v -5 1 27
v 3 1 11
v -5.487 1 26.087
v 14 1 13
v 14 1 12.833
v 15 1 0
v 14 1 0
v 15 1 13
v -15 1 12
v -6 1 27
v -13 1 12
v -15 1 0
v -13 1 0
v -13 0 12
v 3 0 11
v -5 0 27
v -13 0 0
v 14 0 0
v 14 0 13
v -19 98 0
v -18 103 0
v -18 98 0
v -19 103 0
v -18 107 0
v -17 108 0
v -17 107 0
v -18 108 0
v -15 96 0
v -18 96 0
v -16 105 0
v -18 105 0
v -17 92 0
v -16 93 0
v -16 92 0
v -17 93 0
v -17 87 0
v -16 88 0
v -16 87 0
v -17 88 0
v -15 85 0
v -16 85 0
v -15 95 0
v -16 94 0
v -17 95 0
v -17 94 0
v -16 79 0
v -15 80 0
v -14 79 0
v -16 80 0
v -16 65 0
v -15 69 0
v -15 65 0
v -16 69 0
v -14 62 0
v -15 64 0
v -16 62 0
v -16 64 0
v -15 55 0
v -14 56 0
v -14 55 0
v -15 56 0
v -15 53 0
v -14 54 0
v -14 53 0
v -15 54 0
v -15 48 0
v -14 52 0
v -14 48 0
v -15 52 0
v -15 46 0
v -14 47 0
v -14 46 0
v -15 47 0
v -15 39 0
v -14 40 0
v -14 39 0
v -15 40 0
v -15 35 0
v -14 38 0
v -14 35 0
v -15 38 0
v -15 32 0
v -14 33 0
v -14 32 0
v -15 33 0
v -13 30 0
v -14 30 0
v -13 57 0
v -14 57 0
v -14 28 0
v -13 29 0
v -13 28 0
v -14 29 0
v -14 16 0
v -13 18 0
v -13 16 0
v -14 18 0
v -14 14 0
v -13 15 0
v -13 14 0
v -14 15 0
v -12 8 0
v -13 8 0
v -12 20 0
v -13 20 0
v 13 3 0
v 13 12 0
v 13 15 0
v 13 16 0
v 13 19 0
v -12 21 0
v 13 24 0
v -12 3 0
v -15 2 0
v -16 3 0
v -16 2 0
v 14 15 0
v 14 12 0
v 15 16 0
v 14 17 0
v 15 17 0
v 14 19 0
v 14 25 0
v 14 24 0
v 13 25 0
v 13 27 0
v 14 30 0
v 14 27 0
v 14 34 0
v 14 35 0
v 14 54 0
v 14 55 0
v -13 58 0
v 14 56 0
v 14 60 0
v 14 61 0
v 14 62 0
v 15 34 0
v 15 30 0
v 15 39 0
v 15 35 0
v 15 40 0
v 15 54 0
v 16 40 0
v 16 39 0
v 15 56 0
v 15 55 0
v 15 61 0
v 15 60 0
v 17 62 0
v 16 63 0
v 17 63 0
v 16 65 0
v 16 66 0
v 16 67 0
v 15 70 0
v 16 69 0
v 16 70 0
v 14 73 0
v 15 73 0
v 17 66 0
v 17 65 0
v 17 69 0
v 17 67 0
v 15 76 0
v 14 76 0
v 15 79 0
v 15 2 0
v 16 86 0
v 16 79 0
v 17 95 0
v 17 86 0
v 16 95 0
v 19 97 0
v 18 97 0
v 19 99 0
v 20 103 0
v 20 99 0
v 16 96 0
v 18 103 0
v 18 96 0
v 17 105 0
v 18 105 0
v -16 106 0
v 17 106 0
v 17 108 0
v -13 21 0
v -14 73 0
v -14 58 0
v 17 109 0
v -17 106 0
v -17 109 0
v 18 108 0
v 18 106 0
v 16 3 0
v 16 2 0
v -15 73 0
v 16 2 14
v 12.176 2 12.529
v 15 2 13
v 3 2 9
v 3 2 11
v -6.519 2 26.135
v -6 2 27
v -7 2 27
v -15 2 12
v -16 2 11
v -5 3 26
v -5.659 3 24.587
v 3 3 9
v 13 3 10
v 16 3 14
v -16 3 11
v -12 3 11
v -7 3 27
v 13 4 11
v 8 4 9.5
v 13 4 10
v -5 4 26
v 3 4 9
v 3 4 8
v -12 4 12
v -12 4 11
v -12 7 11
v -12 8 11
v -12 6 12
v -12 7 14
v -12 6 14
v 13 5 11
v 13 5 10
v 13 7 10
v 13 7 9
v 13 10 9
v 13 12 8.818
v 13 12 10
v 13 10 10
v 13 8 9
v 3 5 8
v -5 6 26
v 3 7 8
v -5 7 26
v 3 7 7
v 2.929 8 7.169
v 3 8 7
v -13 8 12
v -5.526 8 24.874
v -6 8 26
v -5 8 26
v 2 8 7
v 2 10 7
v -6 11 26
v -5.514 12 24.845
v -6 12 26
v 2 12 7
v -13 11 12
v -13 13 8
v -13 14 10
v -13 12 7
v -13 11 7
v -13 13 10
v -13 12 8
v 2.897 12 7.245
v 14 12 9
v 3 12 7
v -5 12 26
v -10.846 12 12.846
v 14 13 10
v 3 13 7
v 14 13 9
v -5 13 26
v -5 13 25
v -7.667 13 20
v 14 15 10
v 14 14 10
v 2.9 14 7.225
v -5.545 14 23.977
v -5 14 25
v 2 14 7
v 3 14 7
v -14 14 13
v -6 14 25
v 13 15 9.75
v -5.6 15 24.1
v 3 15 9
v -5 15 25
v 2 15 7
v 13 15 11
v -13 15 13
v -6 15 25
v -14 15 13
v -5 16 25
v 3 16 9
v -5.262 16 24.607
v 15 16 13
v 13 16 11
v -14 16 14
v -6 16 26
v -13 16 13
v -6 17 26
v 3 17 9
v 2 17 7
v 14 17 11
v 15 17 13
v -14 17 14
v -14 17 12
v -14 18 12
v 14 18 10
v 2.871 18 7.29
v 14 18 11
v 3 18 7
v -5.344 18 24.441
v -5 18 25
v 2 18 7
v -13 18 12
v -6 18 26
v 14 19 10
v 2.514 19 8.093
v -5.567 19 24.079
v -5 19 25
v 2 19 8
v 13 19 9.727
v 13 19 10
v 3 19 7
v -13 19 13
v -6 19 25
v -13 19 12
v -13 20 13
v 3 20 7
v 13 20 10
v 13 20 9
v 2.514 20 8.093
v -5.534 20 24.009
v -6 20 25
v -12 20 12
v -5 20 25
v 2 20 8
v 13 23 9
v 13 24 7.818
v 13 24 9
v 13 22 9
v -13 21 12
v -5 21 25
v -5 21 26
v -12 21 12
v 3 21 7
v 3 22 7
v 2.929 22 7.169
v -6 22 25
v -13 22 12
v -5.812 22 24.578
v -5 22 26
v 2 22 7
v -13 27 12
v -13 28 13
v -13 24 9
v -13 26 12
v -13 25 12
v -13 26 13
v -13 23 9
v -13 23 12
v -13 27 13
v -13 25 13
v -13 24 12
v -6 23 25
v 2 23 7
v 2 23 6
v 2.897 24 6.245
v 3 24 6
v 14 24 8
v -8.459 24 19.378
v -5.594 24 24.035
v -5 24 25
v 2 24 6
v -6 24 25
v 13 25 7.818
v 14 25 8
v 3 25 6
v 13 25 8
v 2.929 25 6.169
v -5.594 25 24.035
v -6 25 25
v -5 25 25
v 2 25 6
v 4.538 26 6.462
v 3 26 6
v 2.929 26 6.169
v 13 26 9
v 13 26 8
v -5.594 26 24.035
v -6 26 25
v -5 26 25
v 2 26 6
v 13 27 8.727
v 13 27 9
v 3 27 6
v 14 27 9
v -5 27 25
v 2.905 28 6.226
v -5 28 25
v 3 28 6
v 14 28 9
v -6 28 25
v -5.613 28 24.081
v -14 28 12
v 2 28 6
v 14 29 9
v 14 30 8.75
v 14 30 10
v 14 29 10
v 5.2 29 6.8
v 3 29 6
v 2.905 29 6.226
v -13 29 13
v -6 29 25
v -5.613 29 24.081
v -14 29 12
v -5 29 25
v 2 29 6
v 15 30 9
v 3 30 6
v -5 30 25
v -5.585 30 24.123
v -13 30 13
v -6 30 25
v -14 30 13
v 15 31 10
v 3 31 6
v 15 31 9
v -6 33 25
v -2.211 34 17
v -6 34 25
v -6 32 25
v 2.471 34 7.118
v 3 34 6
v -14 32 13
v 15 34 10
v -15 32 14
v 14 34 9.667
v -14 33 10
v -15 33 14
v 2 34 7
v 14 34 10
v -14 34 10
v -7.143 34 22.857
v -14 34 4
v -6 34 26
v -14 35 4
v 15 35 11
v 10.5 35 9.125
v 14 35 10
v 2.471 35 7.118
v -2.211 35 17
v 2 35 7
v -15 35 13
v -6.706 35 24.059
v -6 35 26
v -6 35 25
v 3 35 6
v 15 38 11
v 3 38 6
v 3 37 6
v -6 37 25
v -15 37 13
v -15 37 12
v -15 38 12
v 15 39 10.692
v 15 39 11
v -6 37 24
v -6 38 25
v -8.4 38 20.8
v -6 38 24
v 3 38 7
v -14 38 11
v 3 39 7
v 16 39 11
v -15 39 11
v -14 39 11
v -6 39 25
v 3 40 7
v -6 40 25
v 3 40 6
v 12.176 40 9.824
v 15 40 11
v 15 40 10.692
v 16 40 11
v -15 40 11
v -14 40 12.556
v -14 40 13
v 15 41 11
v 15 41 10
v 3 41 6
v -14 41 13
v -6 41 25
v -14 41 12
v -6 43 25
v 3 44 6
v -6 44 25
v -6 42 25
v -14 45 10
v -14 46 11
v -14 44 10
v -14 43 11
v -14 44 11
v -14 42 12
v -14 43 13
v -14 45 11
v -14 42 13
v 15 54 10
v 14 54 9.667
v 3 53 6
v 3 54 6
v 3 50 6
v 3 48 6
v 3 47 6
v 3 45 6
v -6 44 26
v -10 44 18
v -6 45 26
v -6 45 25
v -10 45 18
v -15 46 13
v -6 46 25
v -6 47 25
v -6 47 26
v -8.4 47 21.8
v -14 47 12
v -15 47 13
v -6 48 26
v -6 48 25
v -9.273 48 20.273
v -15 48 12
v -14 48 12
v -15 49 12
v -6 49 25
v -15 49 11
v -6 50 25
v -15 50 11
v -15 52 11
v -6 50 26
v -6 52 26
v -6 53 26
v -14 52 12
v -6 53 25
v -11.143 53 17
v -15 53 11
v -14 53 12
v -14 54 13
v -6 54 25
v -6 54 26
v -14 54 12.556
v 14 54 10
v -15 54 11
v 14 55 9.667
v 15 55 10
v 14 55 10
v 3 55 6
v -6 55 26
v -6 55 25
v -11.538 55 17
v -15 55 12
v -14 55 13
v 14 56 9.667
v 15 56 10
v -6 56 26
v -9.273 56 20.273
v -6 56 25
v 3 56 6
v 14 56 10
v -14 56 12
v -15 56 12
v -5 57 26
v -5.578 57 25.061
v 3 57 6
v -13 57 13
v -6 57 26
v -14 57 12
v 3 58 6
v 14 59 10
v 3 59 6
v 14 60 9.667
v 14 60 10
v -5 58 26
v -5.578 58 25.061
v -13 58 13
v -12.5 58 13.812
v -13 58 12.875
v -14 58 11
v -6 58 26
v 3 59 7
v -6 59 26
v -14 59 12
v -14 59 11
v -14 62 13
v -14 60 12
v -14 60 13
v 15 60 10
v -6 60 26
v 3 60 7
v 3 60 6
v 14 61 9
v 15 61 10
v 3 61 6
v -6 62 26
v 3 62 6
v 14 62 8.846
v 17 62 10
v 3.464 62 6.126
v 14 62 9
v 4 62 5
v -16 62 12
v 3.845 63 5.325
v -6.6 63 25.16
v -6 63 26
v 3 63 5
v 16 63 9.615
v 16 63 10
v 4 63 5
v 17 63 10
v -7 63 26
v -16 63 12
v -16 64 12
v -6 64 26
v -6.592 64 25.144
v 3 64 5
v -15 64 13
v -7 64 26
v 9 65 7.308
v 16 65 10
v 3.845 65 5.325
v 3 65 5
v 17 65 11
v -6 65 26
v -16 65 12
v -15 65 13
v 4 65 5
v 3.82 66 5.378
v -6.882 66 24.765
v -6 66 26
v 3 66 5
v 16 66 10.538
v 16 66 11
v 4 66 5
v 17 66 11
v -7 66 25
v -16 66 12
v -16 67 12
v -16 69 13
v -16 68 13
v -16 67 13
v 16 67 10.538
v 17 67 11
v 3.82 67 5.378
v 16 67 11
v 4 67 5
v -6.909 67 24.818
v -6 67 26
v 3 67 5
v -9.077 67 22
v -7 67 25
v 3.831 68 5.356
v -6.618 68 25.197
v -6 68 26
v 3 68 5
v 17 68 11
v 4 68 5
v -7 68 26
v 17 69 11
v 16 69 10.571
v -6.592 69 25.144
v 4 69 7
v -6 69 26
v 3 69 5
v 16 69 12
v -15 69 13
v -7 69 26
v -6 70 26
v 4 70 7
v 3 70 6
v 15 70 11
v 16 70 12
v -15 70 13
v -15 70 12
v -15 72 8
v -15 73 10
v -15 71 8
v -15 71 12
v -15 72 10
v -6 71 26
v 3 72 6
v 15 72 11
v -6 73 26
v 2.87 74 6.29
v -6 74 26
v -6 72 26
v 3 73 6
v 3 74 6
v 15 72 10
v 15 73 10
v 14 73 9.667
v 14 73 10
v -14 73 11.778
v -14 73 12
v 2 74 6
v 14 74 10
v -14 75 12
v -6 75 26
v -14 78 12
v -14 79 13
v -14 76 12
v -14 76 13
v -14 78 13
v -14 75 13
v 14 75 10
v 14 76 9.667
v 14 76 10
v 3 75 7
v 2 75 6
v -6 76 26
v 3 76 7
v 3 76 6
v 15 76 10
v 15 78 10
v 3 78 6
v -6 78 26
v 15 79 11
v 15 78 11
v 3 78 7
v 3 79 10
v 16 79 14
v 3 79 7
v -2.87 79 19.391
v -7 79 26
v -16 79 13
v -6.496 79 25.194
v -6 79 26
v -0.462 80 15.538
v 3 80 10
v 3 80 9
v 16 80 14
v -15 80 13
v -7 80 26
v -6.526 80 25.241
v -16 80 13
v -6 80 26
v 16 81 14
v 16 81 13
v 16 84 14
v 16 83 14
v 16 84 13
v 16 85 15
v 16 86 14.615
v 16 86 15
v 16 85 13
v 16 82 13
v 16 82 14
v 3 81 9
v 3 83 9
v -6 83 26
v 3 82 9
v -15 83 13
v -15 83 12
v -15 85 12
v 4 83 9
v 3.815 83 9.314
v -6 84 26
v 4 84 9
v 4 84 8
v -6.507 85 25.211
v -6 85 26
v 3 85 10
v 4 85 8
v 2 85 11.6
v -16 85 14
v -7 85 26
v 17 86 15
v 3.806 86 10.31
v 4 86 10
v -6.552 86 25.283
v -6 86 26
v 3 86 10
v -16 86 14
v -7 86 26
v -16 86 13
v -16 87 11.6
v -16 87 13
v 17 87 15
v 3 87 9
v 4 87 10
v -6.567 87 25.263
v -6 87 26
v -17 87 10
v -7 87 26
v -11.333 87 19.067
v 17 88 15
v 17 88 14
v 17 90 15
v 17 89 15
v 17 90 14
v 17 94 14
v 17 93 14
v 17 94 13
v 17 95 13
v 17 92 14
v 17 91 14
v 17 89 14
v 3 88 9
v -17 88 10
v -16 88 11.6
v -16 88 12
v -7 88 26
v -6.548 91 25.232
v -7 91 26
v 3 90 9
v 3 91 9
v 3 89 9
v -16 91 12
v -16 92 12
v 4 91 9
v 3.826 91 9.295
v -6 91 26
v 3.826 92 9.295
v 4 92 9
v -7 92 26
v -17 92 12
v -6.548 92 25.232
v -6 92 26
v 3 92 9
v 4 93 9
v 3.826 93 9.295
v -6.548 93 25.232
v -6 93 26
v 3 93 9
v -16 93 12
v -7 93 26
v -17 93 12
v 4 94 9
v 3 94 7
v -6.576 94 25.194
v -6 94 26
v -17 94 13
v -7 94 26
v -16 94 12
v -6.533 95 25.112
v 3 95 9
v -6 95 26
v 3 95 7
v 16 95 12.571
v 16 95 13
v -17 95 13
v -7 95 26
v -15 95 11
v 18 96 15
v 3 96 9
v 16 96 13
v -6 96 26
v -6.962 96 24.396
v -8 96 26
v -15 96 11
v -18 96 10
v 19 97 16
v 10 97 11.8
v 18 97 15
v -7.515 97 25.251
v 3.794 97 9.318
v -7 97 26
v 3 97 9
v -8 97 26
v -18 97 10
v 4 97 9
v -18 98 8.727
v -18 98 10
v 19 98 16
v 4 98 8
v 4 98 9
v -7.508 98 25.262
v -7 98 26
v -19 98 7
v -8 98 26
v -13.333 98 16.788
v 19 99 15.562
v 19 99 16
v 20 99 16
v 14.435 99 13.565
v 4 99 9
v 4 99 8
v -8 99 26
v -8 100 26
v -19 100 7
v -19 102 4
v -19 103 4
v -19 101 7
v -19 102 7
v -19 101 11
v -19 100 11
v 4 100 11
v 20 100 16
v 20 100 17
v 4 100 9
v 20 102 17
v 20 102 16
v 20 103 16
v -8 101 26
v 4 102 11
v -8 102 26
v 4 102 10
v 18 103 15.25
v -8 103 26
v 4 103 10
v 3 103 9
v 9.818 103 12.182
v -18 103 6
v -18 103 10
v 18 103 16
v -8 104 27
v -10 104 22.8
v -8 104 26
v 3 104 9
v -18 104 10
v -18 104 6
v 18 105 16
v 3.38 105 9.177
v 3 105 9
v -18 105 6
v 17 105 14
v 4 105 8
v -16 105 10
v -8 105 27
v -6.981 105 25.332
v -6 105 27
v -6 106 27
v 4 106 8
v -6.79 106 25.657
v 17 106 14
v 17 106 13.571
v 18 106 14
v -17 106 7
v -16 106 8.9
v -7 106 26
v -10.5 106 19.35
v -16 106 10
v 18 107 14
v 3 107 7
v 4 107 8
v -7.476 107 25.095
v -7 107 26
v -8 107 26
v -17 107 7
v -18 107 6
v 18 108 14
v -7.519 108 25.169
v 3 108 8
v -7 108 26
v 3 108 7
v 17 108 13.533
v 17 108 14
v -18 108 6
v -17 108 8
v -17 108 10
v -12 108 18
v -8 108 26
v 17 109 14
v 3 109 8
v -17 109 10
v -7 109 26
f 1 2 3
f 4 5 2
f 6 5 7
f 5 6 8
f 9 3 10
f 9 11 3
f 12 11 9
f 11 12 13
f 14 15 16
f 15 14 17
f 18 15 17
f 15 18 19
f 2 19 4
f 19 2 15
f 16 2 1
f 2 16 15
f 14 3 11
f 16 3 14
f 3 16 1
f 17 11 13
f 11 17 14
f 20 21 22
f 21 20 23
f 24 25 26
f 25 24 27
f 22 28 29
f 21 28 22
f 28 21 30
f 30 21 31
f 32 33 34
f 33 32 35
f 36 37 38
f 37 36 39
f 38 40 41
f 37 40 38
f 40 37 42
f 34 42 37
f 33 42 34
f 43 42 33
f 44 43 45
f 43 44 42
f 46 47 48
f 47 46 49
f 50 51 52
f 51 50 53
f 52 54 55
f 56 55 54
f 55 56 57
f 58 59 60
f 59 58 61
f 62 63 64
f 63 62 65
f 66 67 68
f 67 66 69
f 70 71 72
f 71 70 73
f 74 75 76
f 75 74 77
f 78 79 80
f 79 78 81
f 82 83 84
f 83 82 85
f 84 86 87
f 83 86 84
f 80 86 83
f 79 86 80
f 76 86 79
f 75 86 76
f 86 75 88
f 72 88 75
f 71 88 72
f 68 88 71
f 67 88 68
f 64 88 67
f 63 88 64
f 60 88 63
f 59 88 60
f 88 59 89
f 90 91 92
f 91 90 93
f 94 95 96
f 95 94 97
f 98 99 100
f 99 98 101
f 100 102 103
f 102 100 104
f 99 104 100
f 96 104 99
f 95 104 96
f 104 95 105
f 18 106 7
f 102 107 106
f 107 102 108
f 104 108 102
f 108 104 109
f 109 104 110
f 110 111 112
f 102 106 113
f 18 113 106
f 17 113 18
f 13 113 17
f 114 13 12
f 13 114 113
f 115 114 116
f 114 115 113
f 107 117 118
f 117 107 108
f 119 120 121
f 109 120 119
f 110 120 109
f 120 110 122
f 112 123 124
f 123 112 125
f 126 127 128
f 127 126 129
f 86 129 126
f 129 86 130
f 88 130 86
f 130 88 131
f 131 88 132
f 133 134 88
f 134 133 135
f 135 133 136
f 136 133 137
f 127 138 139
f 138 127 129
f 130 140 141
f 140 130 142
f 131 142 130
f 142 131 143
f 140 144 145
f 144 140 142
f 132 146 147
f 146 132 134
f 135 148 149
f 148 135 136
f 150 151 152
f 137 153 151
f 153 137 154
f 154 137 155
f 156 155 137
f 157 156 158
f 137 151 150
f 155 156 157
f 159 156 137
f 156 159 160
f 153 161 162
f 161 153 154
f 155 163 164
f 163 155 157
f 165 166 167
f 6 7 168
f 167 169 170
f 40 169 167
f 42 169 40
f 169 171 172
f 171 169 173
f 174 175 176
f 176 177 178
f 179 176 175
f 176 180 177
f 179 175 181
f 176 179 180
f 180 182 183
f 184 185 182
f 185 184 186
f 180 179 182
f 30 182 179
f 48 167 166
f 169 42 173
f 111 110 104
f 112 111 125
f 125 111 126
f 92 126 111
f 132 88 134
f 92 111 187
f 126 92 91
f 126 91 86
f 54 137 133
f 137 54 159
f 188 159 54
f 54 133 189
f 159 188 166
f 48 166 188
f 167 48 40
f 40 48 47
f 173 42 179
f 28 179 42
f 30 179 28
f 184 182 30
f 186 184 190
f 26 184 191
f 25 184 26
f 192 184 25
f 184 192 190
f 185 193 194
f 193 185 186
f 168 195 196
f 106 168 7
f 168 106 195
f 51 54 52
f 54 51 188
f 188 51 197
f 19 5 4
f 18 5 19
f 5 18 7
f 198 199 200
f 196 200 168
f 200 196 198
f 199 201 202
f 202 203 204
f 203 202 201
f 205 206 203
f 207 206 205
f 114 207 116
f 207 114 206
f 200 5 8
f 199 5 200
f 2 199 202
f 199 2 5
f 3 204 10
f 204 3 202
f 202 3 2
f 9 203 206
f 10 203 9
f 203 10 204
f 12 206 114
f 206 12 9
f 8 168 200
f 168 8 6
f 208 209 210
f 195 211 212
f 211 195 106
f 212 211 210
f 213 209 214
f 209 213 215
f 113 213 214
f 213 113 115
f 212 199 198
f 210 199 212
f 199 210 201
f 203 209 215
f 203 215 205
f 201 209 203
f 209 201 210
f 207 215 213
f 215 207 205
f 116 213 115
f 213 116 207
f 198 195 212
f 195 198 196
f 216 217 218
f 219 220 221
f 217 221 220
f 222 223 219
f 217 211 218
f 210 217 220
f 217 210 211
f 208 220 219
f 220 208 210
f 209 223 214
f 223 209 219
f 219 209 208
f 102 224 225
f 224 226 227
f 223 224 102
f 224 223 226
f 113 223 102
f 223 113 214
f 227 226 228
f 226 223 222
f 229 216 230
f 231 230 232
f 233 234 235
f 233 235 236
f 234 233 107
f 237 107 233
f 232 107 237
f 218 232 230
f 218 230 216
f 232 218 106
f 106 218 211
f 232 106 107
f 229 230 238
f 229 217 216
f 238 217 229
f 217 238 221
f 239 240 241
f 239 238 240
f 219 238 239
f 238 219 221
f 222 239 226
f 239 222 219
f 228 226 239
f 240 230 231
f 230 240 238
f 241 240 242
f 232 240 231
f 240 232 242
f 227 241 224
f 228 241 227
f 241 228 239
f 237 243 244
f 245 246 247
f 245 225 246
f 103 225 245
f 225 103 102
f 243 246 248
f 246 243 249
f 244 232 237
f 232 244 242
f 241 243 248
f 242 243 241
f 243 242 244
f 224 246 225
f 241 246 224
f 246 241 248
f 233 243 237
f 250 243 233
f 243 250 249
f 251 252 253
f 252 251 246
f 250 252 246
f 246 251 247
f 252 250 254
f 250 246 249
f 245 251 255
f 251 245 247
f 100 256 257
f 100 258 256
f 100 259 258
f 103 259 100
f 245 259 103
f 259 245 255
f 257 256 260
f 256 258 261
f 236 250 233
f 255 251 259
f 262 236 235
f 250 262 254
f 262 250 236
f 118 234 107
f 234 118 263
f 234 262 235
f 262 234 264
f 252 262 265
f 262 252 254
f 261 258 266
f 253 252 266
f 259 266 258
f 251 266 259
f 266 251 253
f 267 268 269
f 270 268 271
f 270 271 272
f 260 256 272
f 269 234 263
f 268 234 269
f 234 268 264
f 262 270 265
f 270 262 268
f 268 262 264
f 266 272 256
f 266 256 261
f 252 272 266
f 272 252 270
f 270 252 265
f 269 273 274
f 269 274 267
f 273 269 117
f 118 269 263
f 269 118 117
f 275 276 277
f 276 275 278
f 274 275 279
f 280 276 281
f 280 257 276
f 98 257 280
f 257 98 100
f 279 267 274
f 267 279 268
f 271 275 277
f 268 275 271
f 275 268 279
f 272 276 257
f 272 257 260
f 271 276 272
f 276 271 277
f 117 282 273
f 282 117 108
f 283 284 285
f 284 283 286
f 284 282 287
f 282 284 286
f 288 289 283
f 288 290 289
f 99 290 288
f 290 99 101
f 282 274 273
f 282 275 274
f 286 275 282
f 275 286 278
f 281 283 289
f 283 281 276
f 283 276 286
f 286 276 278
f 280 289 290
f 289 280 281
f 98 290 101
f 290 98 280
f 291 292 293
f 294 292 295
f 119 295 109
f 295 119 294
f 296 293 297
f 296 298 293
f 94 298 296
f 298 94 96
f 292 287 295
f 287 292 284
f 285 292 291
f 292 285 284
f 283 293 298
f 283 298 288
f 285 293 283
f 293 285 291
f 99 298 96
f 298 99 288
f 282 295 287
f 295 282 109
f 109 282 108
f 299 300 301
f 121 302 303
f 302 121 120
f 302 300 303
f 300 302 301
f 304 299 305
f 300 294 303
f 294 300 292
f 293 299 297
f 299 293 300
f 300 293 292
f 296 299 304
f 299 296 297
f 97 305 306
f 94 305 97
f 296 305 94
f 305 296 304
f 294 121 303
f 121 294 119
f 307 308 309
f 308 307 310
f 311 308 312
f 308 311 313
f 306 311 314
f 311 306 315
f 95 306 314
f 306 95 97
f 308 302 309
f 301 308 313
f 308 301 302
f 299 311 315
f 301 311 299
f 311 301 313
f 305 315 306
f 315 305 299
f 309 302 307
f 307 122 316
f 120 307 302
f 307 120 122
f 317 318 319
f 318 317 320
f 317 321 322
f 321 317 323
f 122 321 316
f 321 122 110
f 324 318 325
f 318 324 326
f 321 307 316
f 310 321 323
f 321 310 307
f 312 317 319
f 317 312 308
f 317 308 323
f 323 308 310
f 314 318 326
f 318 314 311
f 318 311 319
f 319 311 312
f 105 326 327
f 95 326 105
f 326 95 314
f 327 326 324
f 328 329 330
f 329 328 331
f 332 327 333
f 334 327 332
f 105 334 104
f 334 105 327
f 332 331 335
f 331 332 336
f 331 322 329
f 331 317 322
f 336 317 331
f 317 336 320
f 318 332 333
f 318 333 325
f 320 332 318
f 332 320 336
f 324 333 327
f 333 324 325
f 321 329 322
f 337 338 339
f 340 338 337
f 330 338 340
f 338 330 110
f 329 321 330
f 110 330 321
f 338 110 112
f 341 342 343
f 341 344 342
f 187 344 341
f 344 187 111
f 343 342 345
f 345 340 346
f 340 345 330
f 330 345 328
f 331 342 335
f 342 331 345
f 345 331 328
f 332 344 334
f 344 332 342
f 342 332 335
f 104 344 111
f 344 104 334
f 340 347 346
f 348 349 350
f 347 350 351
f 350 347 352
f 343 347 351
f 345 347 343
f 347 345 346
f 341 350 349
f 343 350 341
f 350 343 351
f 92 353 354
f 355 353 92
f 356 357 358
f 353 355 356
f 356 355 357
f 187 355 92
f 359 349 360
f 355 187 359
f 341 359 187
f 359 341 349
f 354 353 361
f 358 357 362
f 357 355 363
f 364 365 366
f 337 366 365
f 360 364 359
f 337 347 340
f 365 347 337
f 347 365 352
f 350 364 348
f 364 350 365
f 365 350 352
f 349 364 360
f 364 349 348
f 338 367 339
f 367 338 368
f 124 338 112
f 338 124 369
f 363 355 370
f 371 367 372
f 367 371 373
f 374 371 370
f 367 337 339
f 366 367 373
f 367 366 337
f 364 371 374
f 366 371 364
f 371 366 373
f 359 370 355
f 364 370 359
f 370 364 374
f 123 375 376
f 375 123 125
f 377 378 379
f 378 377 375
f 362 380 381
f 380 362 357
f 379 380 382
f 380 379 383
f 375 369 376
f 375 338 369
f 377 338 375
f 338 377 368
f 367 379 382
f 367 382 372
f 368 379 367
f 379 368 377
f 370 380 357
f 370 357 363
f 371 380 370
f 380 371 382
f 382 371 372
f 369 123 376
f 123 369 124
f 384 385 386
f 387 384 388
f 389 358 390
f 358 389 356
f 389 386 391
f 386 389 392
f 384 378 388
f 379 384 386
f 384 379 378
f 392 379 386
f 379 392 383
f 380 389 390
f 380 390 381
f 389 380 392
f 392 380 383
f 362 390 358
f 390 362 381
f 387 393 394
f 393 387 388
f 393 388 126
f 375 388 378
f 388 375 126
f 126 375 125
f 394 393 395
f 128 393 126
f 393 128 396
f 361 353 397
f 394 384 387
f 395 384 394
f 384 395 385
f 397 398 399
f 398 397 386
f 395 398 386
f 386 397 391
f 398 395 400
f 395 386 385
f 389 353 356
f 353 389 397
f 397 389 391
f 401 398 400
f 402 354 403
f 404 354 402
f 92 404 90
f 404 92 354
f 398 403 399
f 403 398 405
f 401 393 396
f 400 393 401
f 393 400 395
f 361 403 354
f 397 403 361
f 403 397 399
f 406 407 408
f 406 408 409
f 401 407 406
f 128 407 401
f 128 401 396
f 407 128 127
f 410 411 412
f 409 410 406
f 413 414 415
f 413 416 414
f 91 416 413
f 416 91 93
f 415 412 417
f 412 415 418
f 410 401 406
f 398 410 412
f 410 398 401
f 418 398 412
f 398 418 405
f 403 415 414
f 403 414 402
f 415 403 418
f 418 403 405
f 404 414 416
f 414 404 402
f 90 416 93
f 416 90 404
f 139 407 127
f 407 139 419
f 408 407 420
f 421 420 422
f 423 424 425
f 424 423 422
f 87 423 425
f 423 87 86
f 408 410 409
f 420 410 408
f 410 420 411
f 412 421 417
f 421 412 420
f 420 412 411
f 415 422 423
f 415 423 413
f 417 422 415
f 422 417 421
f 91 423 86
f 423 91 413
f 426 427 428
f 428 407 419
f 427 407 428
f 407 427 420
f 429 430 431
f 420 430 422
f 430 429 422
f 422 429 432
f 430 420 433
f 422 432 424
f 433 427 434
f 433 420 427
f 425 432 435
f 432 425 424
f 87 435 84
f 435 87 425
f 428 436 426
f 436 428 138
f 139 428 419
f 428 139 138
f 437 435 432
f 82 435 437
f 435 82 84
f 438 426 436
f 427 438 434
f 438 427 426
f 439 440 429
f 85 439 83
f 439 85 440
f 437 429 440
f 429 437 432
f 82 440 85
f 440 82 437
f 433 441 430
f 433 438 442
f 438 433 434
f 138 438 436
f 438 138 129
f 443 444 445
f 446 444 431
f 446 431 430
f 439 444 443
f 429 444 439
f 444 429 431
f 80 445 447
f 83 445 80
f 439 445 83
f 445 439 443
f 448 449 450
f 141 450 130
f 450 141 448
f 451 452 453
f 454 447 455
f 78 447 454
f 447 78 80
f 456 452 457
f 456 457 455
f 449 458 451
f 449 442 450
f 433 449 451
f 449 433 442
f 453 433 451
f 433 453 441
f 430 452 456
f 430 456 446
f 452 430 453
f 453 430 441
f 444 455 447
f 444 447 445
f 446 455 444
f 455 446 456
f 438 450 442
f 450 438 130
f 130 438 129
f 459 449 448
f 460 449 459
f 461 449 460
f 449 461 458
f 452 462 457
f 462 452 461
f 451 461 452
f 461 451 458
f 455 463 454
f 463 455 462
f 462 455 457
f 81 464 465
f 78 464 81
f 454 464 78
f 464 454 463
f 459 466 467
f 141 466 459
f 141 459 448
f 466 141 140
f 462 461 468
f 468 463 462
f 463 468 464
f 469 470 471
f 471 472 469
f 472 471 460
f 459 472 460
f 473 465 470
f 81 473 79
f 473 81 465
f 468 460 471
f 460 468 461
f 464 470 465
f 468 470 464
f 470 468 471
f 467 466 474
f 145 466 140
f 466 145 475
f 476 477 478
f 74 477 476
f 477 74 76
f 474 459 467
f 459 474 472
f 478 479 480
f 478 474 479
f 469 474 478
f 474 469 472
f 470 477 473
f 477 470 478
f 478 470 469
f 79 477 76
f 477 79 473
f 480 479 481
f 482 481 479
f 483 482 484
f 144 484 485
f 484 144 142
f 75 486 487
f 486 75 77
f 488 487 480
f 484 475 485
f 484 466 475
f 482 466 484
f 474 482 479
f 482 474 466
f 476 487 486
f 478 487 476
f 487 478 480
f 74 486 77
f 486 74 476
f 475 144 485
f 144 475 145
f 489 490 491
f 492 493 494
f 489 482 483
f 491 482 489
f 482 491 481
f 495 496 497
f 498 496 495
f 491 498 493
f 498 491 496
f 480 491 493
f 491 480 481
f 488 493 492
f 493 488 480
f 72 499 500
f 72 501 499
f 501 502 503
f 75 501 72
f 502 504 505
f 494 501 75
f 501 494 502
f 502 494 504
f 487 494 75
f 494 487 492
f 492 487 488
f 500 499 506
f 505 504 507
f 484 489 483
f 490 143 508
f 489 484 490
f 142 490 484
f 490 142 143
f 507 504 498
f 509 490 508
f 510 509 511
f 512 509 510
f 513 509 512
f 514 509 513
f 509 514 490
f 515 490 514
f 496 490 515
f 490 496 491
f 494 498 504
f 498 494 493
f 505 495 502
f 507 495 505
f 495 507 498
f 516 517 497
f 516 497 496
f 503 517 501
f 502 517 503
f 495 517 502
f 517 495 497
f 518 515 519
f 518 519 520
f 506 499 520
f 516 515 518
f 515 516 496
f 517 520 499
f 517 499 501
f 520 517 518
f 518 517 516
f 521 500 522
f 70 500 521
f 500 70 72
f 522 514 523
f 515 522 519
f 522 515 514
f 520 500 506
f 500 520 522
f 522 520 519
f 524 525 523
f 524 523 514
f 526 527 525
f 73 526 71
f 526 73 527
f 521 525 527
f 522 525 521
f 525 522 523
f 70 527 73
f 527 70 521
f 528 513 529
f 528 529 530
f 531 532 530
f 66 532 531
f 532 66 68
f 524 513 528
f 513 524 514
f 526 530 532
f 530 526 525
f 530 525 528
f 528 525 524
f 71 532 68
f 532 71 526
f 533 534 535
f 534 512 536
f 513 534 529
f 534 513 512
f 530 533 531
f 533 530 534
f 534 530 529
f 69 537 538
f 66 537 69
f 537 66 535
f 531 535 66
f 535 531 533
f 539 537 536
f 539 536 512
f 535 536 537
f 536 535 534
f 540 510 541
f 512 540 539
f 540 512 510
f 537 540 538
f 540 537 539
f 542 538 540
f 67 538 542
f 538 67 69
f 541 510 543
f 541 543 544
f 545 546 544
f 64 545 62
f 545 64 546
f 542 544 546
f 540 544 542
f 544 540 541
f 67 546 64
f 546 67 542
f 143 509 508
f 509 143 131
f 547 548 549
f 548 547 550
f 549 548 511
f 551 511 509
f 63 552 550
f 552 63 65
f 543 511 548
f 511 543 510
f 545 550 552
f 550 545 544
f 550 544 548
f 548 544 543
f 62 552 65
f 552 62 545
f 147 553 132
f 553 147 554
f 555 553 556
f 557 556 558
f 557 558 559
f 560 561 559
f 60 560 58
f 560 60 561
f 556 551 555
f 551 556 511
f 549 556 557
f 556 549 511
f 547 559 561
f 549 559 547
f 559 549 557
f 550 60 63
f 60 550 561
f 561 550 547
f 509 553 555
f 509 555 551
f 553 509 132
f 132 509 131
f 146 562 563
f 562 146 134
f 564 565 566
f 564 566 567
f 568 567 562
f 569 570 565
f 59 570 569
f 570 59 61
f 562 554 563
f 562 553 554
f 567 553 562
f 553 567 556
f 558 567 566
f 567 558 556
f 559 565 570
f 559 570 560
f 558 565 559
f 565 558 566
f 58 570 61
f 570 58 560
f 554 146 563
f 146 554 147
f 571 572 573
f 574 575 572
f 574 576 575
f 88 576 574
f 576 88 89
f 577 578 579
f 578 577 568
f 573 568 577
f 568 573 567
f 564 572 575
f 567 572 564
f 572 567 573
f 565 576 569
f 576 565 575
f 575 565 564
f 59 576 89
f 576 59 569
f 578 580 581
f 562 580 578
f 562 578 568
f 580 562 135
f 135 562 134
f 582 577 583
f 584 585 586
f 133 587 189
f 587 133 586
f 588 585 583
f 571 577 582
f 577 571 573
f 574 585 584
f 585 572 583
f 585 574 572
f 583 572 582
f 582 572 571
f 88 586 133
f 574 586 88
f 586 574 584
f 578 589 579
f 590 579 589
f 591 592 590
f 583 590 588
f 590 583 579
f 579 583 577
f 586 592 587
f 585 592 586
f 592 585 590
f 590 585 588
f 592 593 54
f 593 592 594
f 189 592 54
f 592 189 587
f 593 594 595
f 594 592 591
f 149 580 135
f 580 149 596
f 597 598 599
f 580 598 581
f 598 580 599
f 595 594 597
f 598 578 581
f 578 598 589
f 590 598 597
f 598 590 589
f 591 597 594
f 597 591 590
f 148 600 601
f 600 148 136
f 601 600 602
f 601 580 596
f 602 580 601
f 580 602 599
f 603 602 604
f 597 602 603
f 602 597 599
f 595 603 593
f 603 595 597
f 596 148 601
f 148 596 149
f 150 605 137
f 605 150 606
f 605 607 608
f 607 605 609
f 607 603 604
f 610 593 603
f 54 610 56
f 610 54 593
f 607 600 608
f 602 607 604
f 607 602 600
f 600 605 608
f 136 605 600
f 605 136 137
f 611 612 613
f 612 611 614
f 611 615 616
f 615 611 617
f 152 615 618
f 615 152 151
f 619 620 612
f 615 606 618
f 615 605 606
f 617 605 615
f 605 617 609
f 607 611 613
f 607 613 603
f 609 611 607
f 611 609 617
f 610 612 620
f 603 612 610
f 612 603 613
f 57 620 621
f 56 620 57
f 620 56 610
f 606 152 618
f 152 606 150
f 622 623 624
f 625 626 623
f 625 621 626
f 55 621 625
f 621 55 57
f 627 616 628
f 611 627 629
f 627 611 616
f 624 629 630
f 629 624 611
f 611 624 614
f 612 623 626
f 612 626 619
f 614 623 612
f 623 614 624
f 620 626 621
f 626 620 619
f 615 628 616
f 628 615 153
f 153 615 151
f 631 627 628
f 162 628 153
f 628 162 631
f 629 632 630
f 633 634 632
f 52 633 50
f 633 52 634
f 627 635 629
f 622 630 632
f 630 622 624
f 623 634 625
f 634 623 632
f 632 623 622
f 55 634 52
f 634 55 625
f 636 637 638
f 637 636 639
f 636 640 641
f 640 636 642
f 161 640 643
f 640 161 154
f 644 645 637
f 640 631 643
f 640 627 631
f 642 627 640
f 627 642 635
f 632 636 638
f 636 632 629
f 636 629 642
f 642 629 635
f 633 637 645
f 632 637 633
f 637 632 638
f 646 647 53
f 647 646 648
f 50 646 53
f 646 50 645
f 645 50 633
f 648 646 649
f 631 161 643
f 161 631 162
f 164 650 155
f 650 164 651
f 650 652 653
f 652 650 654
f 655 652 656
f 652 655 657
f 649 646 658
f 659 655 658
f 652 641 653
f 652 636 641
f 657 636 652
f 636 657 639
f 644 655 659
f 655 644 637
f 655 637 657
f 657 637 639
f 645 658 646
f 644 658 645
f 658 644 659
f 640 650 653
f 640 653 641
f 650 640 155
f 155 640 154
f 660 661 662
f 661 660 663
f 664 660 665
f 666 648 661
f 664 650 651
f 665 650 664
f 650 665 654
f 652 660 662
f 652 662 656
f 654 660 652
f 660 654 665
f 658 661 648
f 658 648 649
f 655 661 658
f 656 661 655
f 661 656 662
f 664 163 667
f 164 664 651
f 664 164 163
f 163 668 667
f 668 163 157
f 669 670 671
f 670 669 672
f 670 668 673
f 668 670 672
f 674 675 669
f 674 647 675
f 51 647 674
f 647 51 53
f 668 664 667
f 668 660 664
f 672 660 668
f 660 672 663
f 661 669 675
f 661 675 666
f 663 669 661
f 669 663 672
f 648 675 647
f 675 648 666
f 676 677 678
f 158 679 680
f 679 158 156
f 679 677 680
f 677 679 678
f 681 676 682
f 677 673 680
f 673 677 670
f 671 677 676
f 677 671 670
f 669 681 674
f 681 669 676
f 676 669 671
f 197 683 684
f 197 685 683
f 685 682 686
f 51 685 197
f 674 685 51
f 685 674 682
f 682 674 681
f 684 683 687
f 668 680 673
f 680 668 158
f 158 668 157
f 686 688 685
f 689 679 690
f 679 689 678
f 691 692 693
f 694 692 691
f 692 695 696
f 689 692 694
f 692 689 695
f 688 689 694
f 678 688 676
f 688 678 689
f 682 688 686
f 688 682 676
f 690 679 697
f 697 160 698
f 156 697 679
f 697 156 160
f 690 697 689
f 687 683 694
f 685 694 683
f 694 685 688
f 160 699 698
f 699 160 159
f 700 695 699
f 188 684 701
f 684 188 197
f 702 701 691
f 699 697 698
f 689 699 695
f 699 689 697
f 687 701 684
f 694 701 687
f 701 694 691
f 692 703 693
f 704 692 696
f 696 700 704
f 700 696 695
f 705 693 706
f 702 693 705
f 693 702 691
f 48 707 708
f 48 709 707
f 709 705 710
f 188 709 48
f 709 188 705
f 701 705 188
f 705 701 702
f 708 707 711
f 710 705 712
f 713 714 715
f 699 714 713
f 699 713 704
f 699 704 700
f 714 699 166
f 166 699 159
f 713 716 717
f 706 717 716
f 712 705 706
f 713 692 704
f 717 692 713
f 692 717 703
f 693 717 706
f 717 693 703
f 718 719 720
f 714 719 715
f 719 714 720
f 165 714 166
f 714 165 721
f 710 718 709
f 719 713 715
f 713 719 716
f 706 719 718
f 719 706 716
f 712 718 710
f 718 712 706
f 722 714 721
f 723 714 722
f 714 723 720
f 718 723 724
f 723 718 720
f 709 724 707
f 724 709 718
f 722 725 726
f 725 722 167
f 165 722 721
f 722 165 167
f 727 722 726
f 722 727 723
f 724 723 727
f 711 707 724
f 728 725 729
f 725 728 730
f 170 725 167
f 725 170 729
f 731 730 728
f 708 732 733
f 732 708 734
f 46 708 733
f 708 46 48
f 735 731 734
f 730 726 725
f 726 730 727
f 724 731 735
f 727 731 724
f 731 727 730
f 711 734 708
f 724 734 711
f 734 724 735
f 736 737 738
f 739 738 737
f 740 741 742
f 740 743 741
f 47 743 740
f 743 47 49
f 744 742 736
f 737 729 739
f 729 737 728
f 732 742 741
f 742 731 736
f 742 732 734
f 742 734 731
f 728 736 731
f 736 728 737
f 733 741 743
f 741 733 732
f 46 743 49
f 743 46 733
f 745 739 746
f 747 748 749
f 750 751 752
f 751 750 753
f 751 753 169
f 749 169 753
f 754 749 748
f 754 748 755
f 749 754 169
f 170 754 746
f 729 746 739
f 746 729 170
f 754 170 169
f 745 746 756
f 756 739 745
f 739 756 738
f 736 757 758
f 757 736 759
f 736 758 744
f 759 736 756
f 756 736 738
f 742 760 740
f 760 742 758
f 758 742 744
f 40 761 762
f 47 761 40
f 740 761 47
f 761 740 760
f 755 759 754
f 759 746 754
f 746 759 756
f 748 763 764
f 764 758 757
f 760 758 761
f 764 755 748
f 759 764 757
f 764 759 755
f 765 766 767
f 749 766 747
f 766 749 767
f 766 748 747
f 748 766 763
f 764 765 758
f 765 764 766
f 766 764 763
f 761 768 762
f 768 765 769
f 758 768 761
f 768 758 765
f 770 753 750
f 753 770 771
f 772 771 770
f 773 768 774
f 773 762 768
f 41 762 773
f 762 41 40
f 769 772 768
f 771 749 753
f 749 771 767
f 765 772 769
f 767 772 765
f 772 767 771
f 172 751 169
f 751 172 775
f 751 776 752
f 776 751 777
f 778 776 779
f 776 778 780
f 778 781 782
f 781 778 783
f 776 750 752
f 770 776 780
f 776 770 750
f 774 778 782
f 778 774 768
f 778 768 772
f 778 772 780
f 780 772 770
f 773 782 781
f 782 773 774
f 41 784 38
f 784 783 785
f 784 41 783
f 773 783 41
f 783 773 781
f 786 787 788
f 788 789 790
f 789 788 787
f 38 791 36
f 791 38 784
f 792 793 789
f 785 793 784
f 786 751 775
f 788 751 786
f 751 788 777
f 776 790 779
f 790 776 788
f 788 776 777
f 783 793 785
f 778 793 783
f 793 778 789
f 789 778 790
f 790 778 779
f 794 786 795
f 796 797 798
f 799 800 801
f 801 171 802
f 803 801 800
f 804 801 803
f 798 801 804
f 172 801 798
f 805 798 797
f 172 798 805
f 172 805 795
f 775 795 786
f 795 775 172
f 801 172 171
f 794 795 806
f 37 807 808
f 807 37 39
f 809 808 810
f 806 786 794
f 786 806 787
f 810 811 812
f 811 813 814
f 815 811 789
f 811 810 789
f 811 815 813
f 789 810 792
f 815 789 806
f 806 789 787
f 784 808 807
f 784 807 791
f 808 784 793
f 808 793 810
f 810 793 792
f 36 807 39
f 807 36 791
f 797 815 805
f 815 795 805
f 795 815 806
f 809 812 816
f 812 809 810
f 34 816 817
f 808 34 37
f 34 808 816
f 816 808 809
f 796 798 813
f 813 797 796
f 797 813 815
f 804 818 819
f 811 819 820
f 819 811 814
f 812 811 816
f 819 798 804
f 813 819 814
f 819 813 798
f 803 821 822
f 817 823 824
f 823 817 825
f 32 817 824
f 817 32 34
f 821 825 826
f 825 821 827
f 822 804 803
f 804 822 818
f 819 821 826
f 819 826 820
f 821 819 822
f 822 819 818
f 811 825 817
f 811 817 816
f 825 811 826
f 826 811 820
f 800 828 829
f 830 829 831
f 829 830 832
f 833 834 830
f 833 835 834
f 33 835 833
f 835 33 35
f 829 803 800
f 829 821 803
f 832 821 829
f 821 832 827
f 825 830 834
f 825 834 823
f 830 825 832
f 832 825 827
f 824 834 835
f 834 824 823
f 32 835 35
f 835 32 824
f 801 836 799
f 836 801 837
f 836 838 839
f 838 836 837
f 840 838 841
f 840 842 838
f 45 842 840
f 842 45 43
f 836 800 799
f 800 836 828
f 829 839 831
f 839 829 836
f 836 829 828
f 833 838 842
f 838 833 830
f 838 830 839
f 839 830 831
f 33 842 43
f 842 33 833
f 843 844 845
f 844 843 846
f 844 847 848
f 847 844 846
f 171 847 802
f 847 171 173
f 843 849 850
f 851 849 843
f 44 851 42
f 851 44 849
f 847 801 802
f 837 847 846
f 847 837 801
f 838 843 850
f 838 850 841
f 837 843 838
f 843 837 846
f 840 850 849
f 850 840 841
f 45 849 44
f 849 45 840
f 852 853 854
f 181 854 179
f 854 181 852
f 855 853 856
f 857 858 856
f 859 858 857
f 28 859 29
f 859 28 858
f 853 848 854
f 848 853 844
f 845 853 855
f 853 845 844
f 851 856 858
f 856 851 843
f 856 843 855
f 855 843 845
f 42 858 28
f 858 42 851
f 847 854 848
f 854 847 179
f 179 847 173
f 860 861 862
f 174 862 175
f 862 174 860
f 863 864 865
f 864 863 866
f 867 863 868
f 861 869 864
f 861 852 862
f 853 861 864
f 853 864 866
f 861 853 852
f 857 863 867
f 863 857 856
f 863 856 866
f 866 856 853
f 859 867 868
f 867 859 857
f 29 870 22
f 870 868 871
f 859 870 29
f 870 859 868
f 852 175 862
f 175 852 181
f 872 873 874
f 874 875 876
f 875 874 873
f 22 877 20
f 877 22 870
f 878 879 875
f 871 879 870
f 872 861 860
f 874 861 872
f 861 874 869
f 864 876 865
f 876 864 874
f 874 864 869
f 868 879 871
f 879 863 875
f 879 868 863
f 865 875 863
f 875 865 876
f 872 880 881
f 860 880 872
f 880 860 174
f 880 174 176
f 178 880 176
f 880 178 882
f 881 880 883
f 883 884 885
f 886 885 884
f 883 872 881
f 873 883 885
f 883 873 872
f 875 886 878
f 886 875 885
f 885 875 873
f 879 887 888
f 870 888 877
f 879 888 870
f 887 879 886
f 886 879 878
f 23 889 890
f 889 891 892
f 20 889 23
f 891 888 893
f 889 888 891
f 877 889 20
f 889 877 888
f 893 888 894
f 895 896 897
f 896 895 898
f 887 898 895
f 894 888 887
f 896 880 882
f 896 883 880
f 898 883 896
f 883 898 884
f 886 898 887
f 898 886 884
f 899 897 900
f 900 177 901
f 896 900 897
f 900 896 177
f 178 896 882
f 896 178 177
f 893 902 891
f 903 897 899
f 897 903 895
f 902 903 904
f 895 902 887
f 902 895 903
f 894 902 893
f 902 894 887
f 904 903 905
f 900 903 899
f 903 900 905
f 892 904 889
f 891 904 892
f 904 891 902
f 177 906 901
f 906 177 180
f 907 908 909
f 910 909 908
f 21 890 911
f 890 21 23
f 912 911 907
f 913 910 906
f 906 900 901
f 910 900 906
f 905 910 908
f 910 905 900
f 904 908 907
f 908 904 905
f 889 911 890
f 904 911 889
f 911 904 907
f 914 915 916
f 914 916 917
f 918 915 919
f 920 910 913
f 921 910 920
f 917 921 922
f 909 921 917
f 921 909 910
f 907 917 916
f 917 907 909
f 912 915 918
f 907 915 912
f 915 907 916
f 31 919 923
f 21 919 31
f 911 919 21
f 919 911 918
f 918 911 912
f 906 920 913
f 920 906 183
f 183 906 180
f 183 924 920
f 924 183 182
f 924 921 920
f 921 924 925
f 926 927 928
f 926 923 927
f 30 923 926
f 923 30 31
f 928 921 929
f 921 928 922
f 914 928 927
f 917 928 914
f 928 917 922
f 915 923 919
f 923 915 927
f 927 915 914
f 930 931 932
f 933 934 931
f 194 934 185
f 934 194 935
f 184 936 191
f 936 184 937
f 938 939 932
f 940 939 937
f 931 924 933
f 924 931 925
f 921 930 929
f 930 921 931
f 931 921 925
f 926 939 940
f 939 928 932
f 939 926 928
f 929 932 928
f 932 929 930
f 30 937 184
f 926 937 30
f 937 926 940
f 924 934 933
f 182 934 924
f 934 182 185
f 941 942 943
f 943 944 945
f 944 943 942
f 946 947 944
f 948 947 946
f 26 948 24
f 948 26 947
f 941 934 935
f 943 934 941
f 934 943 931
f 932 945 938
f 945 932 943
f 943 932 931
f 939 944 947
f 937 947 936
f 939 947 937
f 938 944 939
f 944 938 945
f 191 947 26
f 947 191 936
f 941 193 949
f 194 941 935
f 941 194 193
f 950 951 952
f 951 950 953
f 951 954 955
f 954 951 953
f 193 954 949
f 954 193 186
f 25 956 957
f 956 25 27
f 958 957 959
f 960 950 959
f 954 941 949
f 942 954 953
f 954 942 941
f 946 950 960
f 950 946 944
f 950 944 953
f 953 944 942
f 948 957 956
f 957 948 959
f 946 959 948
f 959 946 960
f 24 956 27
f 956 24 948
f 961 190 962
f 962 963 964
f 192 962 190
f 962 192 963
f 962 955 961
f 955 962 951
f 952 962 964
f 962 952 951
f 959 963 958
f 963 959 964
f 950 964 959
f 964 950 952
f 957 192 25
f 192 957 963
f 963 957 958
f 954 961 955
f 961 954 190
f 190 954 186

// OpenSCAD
translate([-13,1,0]) rotate([90,0,0]) linear_extrude(height=1) polygon(points=[[0,0], [27,0], [27,13], [16,11], [8,27], [0,12]]);
translate([-15,2,0]) rotate([90,0,0]) linear_extrude(height=1) polygon(points=[[0,0], [30,0], [30,13], [18,11], [9,27], [0,12]]);
translate([-16,3,0]) rotate([90,0,0]) linear_extrude(height=1) polygon(points=[[0,0], [32,0], [32,14], [19,9], [9,27], [0,11]]);
translate([-12,4,0]) rotate([90,0,0]) linear_extrude(height=1) polygon(points=[[0,0], [25,0], [25,10], [15,9], [7,26], [0,11]]);
translate([-12,5,0]) rotate([90,0,0]) linear_extrude(height=1) polygon(points=[[0,0], [25,0], [25,11], [15,8], [7,26], [0,12]]);
translate([-12,6,0]) rotate([90,0,0]) linear_extrude(height=1) polygon(points=[[0,0], [25,0], [25,10], [15,8], [7,26], [0,12]]);
translate([-12,7,0]) rotate([90,0,0]) linear_extrude(height=1) polygon(points=[[0,0], [25,0], [25,10], [15,8], [7,26], [0,14]]);
translate([-12,8,0]) rotate([90,0,0]) linear_extrude(height=1) polygon(points=[[0,0], [25,0], [25,9], [15,7], [7,26], [0,11]]);
translate([-13,9,0]) rotate([90,0,0]) linear_extrude(height=1) polygon(points=[[0,0], [26,0], [26,9], [15,7], [7,26], [0,12]]);
translate([-13,10,0]) rotate([90,0,0]) linear_extrude(height=1) polygon(points=[[0,0], [26,0], [26,9], [15,7], [7,26], [0,12]]);
translate([-13,11,0]) rotate([90,0,0]) linear_extrude(height=1) polygon(points=[[0,0], [26,0], [26,10], [15,7], [7,26], [0,12]]);
translate([-13,12,0]) rotate([90,0,0]) linear_extrude(height=1) polygon(points=[[0,0], [26,0], [26,10], [15,7], [7,26], [0,7]]);
translate([-13,13,0]) rotate([90,0,0]) linear_extrude(height=1) polygon(points=[[0,0], [27,0], [27,9], [16,7], [8,26], [0,8]]);
translate([-13,14,0]) rotate([90,0,0]) linear_extrude(height=1) polygon(points=[[0,0], [27,0], [27,10], [16,7], [8,25], [0,10]]);
translate([-14,15,0]) rotate([90,0,0]) linear_extrude(height=1) polygon(points=[[0,0], [28,0], [28,10], [16,7], [8,25], [0,13]]);
translate([-13,16,0]) rotate([90,0,0]) linear_extrude(height=1) polygon(points=[[0,0], [26,0], [26,11], [16,9], [8,25], [0,13]]);
translate([-14,17,0]) rotate([90,0,0]) linear_extrude(height=1) polygon(points=[[0,0], [29,0], [29,13], [17,9], [8,26], [0,14]]);
translate([-14,18,0]) rotate([90,0,0]) linear_extrude(height=1) polygon(points=[[0,0], [28,0], [28,11], [16,7], [8,26], [0,12]]);
translate([-13,19,0]) rotate([90,0,0]) linear_extrude(height=1) polygon(points=[[0,0], [27,0], [27,10], [16,7], [8,25], [0,12]]);
translate([-13,20,0]) rotate([90,0,0]) linear_extrude(height=1) polygon(points=[[0,0], [26,0], [26,10], [15,8], [7,25], [0,13]]);
translate([-12,21,0]) rotate([90,0,0]) linear_extrude(height=1) polygon(points=[[0,0], [25,0], [25,9], [15,7], [7,25], [0,12]]);
translate([-13,22,0]) rotate([90,0,0]) linear_extrude(height=1) polygon(points=[[0,0], [26,0], [26,9], [16,7], [8,26], [0,12]]);
translate([-13,23,0]) rotate([90,0,0]) linear_extrude(height=1) polygon(points=[[0,0], [26,0], [26,9], [15,7], [7,25], [0,12]]);
translate([-13,24,0]) rotate([90,0,0]) linear_extrude(height=1) polygon(points=[[0,0], [26,0], [26,9], [15,6], [7,25], [0,9]]);
translate([-13,25,0]) rotate([90,0,0]) linear_extrude(height=1) polygon(points=[[0,0], [27,0], [27,8], [16,6], [8,25], [0,12]]);
translate([-13,26,0]) rotate([90,0,0]) linear_extrude(height=1) polygon(points=[[0,0], [26,0], [26,8], [15,6], [7,25], [0,13]]);
translate([-13,27,0]) rotate([90,0,0]) linear_extrude(height=1) polygon(points=[[0,0], [26,0], [26,9], [16,6], [8,25], [0,12]]);
translate([-13,28,0]) rotate([90,0,0]) linear_extrude(height=1) polygon(points=[[0,0], [27,0], [27,9], [16,6], [8,25], [0,13]]);
translate([-14,29,0]) rotate([90,0,0]) linear_extrude(height=1) polygon(points=[[0,0], [28,0], [28,9], [16,6], [8,25], [0,12]]);
translate([-13,30,0]) rotate([90,0,0]) linear_extrude(height=1) polygon(points=[[0,0], [27,0], [27,10], [16,6], [8,25], [0,13]]);
translate([-14,31,0]) rotate([90,0,0]) linear_extrude(height=1) polygon(points=[[0,0], [29,0], [29,9], [17,6], [8,25], [0,13]]);
translate([-14,32,0]) rotate([90,0,0]) linear_extrude(height=1) polygon(points=[[0,0], [29,0], [29,10], [17,6], [8,25], [0,13]]);
translate([-15,33,0]) rotate([90,0,0]) linear_extrude(height=1) polygon(points=[[0,0], [30,0], [30,10], [18,6], [9,25], [0,14]]);
translate([-14,34,0]) rotate([90,0,0]) linear_extrude(height=1) polygon(points=[[0,0], [29,0], [29,10], [17,6], [8,25], [0,10]]);
translate([-14,35,0]) rotate([90,0,0]) linear_extrude(height=1) polygon(points=[[0,0], [28,0], [28,10], [16,7], [8,26], [0,4]]);
translate([-15,36,0]) rotate([90,0,0]) linear_extrude(height=1) polygon(points=[[0,0], [30,0], [30,11], [18,6], [9,25], [0,13]]);
translate([-15,37,0]) rotate([90,0,0]) linear_extrude(height=1) polygon(points=[[0,0], [30,0], [30,11], [18,6], [9,25], [0,13]]);
translate([-15,38,0]) rotate([90,0,0]) linear_extrude(height=1) polygon(points=[[0,0], [30,0], [30,11], [18,6], [9,24], [0,12]]);
translate([-14,39,0]) rotate([90,0,0]) linear_extrude(height=1) polygon(points=[[0,0], [29,0], [29,11], [17,7], [8,25], [0,11]]);
translate([-15,40,0]) rotate([90,0,0]) linear_extrude(height=1) polygon(points=[[0,0], [31,0], [31,11], [18,7], [9,25], [0,11]]);
translate([-14,41,0]) rotate([90,0,0]) linear_extrude(height=1) polygon(points=[[0,0], [29,0], [29,11], [17,6], [8,25], [0,13]]);
translate([-14,42,0]) rotate([90,0,0]) linear_extrude(height=1) polygon(points=[[0,0], [29,0], [29,10], [17,6], [8,25], [0,12]]);
translate([-14,43,0]) rotate([90,0,0]) linear_extrude(height=1) polygon(points=[[0,0], [29,0], [29,10], [17,6], [8,25], [0,13]]);
translate([-14,44,0]) rotate([90,0,0]) linear_extrude(height=1) polygon(points=[[0,0], [29,0], [29,10], [17,6], [8,25], [0,11]]);
translate([-14,45,0]) rotate([90,0,0]) linear_extrude(height=1) polygon(points=[[0,0], [29,0], [29,10], [17,6], [8,26], [0,10]]);
translate([-14,46,0]) rotate([90,0,0]) linear_extrude(height=1) polygon(points=[[0,0], [29,0], [29,10], [17,6], [8,25], [0,11]]);
translate([-15,47,0]) rotate([90,0,0]) linear_extrude(height=1) polygon(points=[[0,0], [30,0], [30,10], [18,6], [9,25], [0,13]]);
translate([-14,48,0]) rotate([90,0,0]) linear_extrude(height=1) polygon(points=[[0,0], [29,0], [29,10], [17,6], [8,26], [0,12]]);
translate([-15,49,0]) rotate([90,0,0]) linear_extrude(height=1) polygon(points=[[0,0], [30,0], [30,10], [18,6], [9,25], [0,12]]);
translate([-15,50,0]) rotate([90,0,0]) linear_extrude(height=1) polygon(points=[[0,0], [30,0], [30,10], [18,6], [9,25], [0,11]]);
translate([-15,51,0]) rotate([90,0,0]) linear_extrude(height=1) polygon(points=[[0,0], [30,0], [30,10], [18,6], [9,26], [0,11]]);
translate([-15,52,0]) rotate([90,0,0]) linear_extrude(height=1) polygon(points=[[0,0], [30,0], [30,10], [18,6], [9,26], [0,11]]);
translate([-14,53,0]) rotate([90,0,0]) linear_extrude(height=1) polygon(points=[[0,0], [29,0], [29,10], [17,6], [8,26], [0,12]]);
translate([-15,54,0]) rotate([90,0,0]) linear_extrude(height=1) polygon(points=[[0,0], [30,0], [30,10], [18,6], [9,25], [0,11]]);
translate([-14,55,0]) rotate([90,0,0]) linear_extrude(height=1) polygon(points=[[0,0], [28,0], [28,10], [17,6], [8,26], [0,13]]);
translate([-15,56,0]) rotate([90,0,0]) linear_extrude(height=1) polygon(points=[[0,0], [30,0], [30,10], [18,6], [9,25], [0,12]]);
translate([-14,57,0]) rotate([90,0,0]) linear_extrude(height=1) polygon(points=[[0,0], [28,0], [28,10], [17,6], [8,26], [0,12]]);
translate([-13,58,0]) rotate([90,0,0]) linear_extrude(height=1) polygon(points=[[0,0], [27,0], [27,10], [16,6], [8,26], [0,13]]);
translate([-14,59,0]) rotate([90,0,0]) linear_extrude(height=1) polygon(points=[[0,0], [28,0], [28,10], [17,6], [8,26], [0,11]]);
translate([-14,60,0]) rotate([90,0,0]) linear_extrude(height=1) polygon(points=[[0,0], [28,0], [28,10], [17,7], [8,26], [0,12]]);
translate([-14,61,0]) rotate([90,0,0]) linear_extrude(height=1) polygon(points=[[0,0], [29,0], [29,10], [17,6], [8,26], [0,13]]);
translate([-14,62,0]) rotate([90,0,0]) linear_extrude(height=1) polygon(points=[[0,0], [28,0], [28,9], [17,6], [8,26], [0,13]]);
translate([-16,63,0]) rotate([90,0,0]) linear_extrude(height=1) polygon(points=[[0,0], [33,0], [33,10], [20,5], [10,26], [0,12]]);
translate([-16,64,0]) rotate([90,0,0]) linear_extrude(height=1) polygon(points=[[0,0], [32,0], [32,10], [19,5], [9,26], [0,12]]);
translate([-15,65,0]) rotate([90,0,0]) linear_extrude(height=1) polygon(points=[[0,0], [31,0], [31,10], [18,5], [9,26], [0,13]]);
translate([-16,66,0]) rotate([90,0,0]) linear_extrude(height=1) polygon(points=[[0,0], [33,0], [33,11], [20,5], [10,26], [0,12]]);
translate([-16,67,0]) rotate([90,0,0]) linear_extrude(height=1) polygon(points=[[0,0], [32,0], [32,11], [19,5], [9,25], [0,12]]);
translate([-16,68,0]) rotate([90,0,0]) linear_extrude(height=1) polygon(points=[[0,0], [33,0], [33,11], [20,5], [10,26], [0,13]]);
translate([-16,69,0]) rotate([90,0,0]) linear_extrude(height=1) polygon(points=[[0,0], [33,0], [33,11], [19,5], [9,26], [0,13]]);
translate([-15,70,0]) rotate([90,0,0]) linear_extrude(height=1) polygon(points=[[0,0], [31,0], [31,12], [19,7], [9,26], [0,13]]);
translate([-15,71,0]) rotate([90,0,0]) linear_extrude(height=1) polygon(points=[[0,0], [30,0], [30,11], [18,6], [9,26], [0,12]]);
translate([-15,72,0]) rotate([90,0,0]) linear_extrude(height=1) polygon(points=[[0,0], [30,0], [30,11], [18,6], [9,26], [0,8]]);
translate([-15,73,0]) rotate([90,0,0]) linear_extrude(height=1) polygon(points=[[0,0], [30,0], [30,10], [18,6], [9,26], [0,10]]);
translate([-14,74,0]) rotate([90,0,0]) linear_extrude(height=1) polygon(points=[[0,0], [28,0], [28,10], [17,6], [8,26], [0,12]]);
translate([-14,75,0]) rotate([90,0,0]) linear_extrude(height=1) polygon(points=[[0,0], [28,0], [28,10], [16,6], [8,26], [0,12]]);
translate([-14,76,0]) rotate([90,0,0]) linear_extrude(height=1) polygon(points=[[0,0], [28,0], [28,10], [17,7], [8,26], [0,13]]);
translate([-14,77,0]) rotate([90,0,0]) linear_extrude(height=1) polygon(points=[[0,0], [29,0], [29,10], [17,6], [8,26], [0,12]]);
translate([-14,78,0]) rotate([90,0,0]) linear_extrude(height=1) polygon(points=[[0,0], [29,0], [29,10], [17,6], [8,26], [0,12]]);
translate([-14,79,0]) rotate([90,0,0]) linear_extrude(height=1) polygon(points=[[0,0], [29,0], [29,11], [17,7], [8,26], [0,13]]);
translate([-16,80,0]) rotate([90,0,0]) linear_extrude(height=1) polygon(points=[[0,0], [32,0], [32,14], [19,10], [9,26], [0,13]]);
translate([-15,81,0]) rotate([90,0,0]) linear_extrude(height=1) polygon(points=[[0,0], [31,0], [31,14], [18,9], [9,26], [0,13]]);
translate([-15,82,0]) rotate([90,0,0]) linear_extrude(height=1) polygon(points=[[0,0], [31,0], [31,13], [18,9], [9,26], [0,13]]);
translate([-15,83,0]) rotate([90,0,0]) linear_extrude(height=1) polygon(points=[[0,0], [31,0], [31,14], [18,9], [9,26], [0,13]]);
translate([-15,84,0]) rotate([90,0,0]) linear_extrude(height=1) polygon(points=[[0,0], [31,0], [31,14], [19,9], [9,26], [0,12]]);
translate([-15,85,0]) rotate([90,0,0]) linear_extrude(height=1) polygon(points=[[0,0], [31,0], [31,13], [19,8], [9,26], [0,12]]);
translate([-16,86,0]) rotate([90,0,0]) linear_extrude(height=1) polygon(points=[[0,0], [32,0], [32,15], [19,10], [9,26], [0,14]]);
translate([-16,87,0]) rotate([90,0,0]) linear_extrude(height=1) polygon(points=[[0,0], [33,0], [33,15], [20,10], [10,26], [0,13]]);
translate([-17,88,0]) rotate([90,0,0]) linear_extrude(height=1) polygon(points=[[0,0], [34,0], [34,15], [20,9], [10,26], [0,10]]);
translate([-16,89,0]) rotate([90,0,0]) linear_extrude(height=1) polygon(points=[[0,0], [33,0], [33,14], [19,9], [9,26], [0,12]]);
translate([-16,90,0]) rotate([90,0,0]) linear_extrude(height=1) polygon(points=[[0,0], [33,0], [33,15], [19,9], [9,26], [0,12]]);
translate([-16,91,0]) rotate([90,0,0]) linear_extrude(height=1) polygon(points=[[0,0], [33,0], [33,14], [19,9], [9,26], [0,12]]);
translate([-16,92,0]) rotate([90,0,0]) linear_extrude(height=1) polygon(points=[[0,0], [33,0], [33,14], [20,9], [10,26], [0,12]]);
translate([-17,93,0]) rotate([90,0,0]) linear_extrude(height=1) polygon(points=[[0,0], [34,0], [34,14], [20,9], [10,26], [0,12]]);
translate([-16,94,0]) rotate([90,0,0]) linear_extrude(height=1) polygon(points=[[0,0], [33,0], [33,14], [20,9], [10,26], [0,12]]);
translate([-17,95,0]) rotate([90,0,0]) linear_extrude(height=1) polygon(points=[[0,0], [34,0], [34,13], [20,7], [10,26], [0,13]]);
translate([-15,96,0]) rotate([90,0,0]) linear_extrude(height=1) polygon(points=[[0,0], [31,0], [31,13], [18,9], [9,26], [0,11]]);
translate([-18,97,0]) rotate([90,0,0]) linear_extrude(height=1) polygon(points=[[0,0], [36,0], [36,15], [21,9], [10,26], [0,10]]);
translate([-18,98,0]) rotate([90,0,0]) linear_extrude(height=1) polygon(points=[[0,0], [37,0], [37,16], [22,9], [11,26], [0,10]]);
translate([-19,99,0]) rotate([90,0,0]) linear_extrude(height=1) polygon(points=[[0,0], [38,0], [38,16], [23,8], [11,26], [0,7]]);
translate([-19,100,0]) rotate([90,0,0]) linear_extrude(height=1) polygon(points=[[0,0], [39,0], [39,16], [23,9], [11,26], [0,7]]);
translate([-19,101,0]) rotate([90,0,0]) linear_extrude(height=1) polygon(points=[[0,0], [39,0], [39,17], [23,11], [11,26], [0,11]]);
translate([-19,102,0]) rotate([90,0,0]) linear_extrude(height=1) polygon(points=[[0,0], [39,0], [39,17], [23,11], [11,26], [0,7]]);
translate([-19,103,0]) rotate([90,0,0]) linear_extrude(height=1) polygon(points=[[0,0], [39,0], [39,16], [23,10], [11,26], [0,4]]);
translate([-18,104,0]) rotate([90,0,0]) linear_extrude(height=1) polygon(points=[[0,0], [36,0], [36,16], [21,9], [10,26], [0,10]]);
translate([-18,105,0]) rotate([90,0,0]) linear_extrude(height=1) polygon(points=[[0,0], [36,0], [36,16], [21,9], [10,27], [0,6]]);
translate([-16,106,0]) rotate([90,0,0]) linear_extrude(height=1) polygon(points=[[0,0], [33,0], [33,14], [20,8], [10,27], [0,10]]);
translate([-17,107,0]) rotate([90,0,0]) linear_extrude(height=1) polygon(points=[[0,0], [35,0], [35,14], [21,8], [10,26], [0,7]]);
translate([-18,108,0]) rotate([90,0,0]) linear_extrude(height=1) polygon(points=[[0,0], [36,0], [36,14], [21,7], [10,26], [0,6]]);
translate([-17,109,0]) rotate([90,0,0]) linear_extrude(height=1) polygon(points=[[0,0], [34,0], [34,14], [20,8], [10,26], [0,10]]);
